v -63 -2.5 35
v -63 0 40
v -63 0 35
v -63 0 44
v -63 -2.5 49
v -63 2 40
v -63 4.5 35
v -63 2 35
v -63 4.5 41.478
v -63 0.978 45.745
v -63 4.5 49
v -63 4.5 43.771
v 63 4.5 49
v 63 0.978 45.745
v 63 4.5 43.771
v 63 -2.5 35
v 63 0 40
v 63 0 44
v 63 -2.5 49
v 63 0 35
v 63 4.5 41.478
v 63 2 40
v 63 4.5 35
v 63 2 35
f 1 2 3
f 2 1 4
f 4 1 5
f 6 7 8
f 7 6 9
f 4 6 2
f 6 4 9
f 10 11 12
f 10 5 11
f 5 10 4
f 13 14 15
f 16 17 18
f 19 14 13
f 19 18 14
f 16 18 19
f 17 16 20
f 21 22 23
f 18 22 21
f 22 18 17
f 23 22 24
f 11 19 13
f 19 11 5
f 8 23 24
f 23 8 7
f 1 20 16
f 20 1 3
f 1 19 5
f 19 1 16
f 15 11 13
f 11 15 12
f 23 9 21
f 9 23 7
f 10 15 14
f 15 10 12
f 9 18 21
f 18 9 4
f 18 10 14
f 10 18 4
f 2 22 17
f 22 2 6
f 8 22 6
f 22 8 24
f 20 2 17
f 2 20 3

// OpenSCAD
keyboardW = 224;
keyboardH = 90;
controllerW = 126;
controllerH = 40;
extraH = 4;

gapW = (keyboardW-controllerW)/2;

difference() {
    translate([-keyboardW/2,0, controllerH + extraH])
    rotate([-asin((controllerH+extraH)/keyboardH),0,0]) 
    difference() {
        union() {
            rotate([asin((controllerH+extraH)/keyboardH),0,0]) 
            translate([gapW,-2.5,-9])
            cube([controllerW , 7, 14]);
        }
        #cube([keyboardW, keyboardH, 2], center=false);
    }

    translate([-controllerW/2,0,0])
    #cube([controllerW, 2, controllerH], center=false);
}
